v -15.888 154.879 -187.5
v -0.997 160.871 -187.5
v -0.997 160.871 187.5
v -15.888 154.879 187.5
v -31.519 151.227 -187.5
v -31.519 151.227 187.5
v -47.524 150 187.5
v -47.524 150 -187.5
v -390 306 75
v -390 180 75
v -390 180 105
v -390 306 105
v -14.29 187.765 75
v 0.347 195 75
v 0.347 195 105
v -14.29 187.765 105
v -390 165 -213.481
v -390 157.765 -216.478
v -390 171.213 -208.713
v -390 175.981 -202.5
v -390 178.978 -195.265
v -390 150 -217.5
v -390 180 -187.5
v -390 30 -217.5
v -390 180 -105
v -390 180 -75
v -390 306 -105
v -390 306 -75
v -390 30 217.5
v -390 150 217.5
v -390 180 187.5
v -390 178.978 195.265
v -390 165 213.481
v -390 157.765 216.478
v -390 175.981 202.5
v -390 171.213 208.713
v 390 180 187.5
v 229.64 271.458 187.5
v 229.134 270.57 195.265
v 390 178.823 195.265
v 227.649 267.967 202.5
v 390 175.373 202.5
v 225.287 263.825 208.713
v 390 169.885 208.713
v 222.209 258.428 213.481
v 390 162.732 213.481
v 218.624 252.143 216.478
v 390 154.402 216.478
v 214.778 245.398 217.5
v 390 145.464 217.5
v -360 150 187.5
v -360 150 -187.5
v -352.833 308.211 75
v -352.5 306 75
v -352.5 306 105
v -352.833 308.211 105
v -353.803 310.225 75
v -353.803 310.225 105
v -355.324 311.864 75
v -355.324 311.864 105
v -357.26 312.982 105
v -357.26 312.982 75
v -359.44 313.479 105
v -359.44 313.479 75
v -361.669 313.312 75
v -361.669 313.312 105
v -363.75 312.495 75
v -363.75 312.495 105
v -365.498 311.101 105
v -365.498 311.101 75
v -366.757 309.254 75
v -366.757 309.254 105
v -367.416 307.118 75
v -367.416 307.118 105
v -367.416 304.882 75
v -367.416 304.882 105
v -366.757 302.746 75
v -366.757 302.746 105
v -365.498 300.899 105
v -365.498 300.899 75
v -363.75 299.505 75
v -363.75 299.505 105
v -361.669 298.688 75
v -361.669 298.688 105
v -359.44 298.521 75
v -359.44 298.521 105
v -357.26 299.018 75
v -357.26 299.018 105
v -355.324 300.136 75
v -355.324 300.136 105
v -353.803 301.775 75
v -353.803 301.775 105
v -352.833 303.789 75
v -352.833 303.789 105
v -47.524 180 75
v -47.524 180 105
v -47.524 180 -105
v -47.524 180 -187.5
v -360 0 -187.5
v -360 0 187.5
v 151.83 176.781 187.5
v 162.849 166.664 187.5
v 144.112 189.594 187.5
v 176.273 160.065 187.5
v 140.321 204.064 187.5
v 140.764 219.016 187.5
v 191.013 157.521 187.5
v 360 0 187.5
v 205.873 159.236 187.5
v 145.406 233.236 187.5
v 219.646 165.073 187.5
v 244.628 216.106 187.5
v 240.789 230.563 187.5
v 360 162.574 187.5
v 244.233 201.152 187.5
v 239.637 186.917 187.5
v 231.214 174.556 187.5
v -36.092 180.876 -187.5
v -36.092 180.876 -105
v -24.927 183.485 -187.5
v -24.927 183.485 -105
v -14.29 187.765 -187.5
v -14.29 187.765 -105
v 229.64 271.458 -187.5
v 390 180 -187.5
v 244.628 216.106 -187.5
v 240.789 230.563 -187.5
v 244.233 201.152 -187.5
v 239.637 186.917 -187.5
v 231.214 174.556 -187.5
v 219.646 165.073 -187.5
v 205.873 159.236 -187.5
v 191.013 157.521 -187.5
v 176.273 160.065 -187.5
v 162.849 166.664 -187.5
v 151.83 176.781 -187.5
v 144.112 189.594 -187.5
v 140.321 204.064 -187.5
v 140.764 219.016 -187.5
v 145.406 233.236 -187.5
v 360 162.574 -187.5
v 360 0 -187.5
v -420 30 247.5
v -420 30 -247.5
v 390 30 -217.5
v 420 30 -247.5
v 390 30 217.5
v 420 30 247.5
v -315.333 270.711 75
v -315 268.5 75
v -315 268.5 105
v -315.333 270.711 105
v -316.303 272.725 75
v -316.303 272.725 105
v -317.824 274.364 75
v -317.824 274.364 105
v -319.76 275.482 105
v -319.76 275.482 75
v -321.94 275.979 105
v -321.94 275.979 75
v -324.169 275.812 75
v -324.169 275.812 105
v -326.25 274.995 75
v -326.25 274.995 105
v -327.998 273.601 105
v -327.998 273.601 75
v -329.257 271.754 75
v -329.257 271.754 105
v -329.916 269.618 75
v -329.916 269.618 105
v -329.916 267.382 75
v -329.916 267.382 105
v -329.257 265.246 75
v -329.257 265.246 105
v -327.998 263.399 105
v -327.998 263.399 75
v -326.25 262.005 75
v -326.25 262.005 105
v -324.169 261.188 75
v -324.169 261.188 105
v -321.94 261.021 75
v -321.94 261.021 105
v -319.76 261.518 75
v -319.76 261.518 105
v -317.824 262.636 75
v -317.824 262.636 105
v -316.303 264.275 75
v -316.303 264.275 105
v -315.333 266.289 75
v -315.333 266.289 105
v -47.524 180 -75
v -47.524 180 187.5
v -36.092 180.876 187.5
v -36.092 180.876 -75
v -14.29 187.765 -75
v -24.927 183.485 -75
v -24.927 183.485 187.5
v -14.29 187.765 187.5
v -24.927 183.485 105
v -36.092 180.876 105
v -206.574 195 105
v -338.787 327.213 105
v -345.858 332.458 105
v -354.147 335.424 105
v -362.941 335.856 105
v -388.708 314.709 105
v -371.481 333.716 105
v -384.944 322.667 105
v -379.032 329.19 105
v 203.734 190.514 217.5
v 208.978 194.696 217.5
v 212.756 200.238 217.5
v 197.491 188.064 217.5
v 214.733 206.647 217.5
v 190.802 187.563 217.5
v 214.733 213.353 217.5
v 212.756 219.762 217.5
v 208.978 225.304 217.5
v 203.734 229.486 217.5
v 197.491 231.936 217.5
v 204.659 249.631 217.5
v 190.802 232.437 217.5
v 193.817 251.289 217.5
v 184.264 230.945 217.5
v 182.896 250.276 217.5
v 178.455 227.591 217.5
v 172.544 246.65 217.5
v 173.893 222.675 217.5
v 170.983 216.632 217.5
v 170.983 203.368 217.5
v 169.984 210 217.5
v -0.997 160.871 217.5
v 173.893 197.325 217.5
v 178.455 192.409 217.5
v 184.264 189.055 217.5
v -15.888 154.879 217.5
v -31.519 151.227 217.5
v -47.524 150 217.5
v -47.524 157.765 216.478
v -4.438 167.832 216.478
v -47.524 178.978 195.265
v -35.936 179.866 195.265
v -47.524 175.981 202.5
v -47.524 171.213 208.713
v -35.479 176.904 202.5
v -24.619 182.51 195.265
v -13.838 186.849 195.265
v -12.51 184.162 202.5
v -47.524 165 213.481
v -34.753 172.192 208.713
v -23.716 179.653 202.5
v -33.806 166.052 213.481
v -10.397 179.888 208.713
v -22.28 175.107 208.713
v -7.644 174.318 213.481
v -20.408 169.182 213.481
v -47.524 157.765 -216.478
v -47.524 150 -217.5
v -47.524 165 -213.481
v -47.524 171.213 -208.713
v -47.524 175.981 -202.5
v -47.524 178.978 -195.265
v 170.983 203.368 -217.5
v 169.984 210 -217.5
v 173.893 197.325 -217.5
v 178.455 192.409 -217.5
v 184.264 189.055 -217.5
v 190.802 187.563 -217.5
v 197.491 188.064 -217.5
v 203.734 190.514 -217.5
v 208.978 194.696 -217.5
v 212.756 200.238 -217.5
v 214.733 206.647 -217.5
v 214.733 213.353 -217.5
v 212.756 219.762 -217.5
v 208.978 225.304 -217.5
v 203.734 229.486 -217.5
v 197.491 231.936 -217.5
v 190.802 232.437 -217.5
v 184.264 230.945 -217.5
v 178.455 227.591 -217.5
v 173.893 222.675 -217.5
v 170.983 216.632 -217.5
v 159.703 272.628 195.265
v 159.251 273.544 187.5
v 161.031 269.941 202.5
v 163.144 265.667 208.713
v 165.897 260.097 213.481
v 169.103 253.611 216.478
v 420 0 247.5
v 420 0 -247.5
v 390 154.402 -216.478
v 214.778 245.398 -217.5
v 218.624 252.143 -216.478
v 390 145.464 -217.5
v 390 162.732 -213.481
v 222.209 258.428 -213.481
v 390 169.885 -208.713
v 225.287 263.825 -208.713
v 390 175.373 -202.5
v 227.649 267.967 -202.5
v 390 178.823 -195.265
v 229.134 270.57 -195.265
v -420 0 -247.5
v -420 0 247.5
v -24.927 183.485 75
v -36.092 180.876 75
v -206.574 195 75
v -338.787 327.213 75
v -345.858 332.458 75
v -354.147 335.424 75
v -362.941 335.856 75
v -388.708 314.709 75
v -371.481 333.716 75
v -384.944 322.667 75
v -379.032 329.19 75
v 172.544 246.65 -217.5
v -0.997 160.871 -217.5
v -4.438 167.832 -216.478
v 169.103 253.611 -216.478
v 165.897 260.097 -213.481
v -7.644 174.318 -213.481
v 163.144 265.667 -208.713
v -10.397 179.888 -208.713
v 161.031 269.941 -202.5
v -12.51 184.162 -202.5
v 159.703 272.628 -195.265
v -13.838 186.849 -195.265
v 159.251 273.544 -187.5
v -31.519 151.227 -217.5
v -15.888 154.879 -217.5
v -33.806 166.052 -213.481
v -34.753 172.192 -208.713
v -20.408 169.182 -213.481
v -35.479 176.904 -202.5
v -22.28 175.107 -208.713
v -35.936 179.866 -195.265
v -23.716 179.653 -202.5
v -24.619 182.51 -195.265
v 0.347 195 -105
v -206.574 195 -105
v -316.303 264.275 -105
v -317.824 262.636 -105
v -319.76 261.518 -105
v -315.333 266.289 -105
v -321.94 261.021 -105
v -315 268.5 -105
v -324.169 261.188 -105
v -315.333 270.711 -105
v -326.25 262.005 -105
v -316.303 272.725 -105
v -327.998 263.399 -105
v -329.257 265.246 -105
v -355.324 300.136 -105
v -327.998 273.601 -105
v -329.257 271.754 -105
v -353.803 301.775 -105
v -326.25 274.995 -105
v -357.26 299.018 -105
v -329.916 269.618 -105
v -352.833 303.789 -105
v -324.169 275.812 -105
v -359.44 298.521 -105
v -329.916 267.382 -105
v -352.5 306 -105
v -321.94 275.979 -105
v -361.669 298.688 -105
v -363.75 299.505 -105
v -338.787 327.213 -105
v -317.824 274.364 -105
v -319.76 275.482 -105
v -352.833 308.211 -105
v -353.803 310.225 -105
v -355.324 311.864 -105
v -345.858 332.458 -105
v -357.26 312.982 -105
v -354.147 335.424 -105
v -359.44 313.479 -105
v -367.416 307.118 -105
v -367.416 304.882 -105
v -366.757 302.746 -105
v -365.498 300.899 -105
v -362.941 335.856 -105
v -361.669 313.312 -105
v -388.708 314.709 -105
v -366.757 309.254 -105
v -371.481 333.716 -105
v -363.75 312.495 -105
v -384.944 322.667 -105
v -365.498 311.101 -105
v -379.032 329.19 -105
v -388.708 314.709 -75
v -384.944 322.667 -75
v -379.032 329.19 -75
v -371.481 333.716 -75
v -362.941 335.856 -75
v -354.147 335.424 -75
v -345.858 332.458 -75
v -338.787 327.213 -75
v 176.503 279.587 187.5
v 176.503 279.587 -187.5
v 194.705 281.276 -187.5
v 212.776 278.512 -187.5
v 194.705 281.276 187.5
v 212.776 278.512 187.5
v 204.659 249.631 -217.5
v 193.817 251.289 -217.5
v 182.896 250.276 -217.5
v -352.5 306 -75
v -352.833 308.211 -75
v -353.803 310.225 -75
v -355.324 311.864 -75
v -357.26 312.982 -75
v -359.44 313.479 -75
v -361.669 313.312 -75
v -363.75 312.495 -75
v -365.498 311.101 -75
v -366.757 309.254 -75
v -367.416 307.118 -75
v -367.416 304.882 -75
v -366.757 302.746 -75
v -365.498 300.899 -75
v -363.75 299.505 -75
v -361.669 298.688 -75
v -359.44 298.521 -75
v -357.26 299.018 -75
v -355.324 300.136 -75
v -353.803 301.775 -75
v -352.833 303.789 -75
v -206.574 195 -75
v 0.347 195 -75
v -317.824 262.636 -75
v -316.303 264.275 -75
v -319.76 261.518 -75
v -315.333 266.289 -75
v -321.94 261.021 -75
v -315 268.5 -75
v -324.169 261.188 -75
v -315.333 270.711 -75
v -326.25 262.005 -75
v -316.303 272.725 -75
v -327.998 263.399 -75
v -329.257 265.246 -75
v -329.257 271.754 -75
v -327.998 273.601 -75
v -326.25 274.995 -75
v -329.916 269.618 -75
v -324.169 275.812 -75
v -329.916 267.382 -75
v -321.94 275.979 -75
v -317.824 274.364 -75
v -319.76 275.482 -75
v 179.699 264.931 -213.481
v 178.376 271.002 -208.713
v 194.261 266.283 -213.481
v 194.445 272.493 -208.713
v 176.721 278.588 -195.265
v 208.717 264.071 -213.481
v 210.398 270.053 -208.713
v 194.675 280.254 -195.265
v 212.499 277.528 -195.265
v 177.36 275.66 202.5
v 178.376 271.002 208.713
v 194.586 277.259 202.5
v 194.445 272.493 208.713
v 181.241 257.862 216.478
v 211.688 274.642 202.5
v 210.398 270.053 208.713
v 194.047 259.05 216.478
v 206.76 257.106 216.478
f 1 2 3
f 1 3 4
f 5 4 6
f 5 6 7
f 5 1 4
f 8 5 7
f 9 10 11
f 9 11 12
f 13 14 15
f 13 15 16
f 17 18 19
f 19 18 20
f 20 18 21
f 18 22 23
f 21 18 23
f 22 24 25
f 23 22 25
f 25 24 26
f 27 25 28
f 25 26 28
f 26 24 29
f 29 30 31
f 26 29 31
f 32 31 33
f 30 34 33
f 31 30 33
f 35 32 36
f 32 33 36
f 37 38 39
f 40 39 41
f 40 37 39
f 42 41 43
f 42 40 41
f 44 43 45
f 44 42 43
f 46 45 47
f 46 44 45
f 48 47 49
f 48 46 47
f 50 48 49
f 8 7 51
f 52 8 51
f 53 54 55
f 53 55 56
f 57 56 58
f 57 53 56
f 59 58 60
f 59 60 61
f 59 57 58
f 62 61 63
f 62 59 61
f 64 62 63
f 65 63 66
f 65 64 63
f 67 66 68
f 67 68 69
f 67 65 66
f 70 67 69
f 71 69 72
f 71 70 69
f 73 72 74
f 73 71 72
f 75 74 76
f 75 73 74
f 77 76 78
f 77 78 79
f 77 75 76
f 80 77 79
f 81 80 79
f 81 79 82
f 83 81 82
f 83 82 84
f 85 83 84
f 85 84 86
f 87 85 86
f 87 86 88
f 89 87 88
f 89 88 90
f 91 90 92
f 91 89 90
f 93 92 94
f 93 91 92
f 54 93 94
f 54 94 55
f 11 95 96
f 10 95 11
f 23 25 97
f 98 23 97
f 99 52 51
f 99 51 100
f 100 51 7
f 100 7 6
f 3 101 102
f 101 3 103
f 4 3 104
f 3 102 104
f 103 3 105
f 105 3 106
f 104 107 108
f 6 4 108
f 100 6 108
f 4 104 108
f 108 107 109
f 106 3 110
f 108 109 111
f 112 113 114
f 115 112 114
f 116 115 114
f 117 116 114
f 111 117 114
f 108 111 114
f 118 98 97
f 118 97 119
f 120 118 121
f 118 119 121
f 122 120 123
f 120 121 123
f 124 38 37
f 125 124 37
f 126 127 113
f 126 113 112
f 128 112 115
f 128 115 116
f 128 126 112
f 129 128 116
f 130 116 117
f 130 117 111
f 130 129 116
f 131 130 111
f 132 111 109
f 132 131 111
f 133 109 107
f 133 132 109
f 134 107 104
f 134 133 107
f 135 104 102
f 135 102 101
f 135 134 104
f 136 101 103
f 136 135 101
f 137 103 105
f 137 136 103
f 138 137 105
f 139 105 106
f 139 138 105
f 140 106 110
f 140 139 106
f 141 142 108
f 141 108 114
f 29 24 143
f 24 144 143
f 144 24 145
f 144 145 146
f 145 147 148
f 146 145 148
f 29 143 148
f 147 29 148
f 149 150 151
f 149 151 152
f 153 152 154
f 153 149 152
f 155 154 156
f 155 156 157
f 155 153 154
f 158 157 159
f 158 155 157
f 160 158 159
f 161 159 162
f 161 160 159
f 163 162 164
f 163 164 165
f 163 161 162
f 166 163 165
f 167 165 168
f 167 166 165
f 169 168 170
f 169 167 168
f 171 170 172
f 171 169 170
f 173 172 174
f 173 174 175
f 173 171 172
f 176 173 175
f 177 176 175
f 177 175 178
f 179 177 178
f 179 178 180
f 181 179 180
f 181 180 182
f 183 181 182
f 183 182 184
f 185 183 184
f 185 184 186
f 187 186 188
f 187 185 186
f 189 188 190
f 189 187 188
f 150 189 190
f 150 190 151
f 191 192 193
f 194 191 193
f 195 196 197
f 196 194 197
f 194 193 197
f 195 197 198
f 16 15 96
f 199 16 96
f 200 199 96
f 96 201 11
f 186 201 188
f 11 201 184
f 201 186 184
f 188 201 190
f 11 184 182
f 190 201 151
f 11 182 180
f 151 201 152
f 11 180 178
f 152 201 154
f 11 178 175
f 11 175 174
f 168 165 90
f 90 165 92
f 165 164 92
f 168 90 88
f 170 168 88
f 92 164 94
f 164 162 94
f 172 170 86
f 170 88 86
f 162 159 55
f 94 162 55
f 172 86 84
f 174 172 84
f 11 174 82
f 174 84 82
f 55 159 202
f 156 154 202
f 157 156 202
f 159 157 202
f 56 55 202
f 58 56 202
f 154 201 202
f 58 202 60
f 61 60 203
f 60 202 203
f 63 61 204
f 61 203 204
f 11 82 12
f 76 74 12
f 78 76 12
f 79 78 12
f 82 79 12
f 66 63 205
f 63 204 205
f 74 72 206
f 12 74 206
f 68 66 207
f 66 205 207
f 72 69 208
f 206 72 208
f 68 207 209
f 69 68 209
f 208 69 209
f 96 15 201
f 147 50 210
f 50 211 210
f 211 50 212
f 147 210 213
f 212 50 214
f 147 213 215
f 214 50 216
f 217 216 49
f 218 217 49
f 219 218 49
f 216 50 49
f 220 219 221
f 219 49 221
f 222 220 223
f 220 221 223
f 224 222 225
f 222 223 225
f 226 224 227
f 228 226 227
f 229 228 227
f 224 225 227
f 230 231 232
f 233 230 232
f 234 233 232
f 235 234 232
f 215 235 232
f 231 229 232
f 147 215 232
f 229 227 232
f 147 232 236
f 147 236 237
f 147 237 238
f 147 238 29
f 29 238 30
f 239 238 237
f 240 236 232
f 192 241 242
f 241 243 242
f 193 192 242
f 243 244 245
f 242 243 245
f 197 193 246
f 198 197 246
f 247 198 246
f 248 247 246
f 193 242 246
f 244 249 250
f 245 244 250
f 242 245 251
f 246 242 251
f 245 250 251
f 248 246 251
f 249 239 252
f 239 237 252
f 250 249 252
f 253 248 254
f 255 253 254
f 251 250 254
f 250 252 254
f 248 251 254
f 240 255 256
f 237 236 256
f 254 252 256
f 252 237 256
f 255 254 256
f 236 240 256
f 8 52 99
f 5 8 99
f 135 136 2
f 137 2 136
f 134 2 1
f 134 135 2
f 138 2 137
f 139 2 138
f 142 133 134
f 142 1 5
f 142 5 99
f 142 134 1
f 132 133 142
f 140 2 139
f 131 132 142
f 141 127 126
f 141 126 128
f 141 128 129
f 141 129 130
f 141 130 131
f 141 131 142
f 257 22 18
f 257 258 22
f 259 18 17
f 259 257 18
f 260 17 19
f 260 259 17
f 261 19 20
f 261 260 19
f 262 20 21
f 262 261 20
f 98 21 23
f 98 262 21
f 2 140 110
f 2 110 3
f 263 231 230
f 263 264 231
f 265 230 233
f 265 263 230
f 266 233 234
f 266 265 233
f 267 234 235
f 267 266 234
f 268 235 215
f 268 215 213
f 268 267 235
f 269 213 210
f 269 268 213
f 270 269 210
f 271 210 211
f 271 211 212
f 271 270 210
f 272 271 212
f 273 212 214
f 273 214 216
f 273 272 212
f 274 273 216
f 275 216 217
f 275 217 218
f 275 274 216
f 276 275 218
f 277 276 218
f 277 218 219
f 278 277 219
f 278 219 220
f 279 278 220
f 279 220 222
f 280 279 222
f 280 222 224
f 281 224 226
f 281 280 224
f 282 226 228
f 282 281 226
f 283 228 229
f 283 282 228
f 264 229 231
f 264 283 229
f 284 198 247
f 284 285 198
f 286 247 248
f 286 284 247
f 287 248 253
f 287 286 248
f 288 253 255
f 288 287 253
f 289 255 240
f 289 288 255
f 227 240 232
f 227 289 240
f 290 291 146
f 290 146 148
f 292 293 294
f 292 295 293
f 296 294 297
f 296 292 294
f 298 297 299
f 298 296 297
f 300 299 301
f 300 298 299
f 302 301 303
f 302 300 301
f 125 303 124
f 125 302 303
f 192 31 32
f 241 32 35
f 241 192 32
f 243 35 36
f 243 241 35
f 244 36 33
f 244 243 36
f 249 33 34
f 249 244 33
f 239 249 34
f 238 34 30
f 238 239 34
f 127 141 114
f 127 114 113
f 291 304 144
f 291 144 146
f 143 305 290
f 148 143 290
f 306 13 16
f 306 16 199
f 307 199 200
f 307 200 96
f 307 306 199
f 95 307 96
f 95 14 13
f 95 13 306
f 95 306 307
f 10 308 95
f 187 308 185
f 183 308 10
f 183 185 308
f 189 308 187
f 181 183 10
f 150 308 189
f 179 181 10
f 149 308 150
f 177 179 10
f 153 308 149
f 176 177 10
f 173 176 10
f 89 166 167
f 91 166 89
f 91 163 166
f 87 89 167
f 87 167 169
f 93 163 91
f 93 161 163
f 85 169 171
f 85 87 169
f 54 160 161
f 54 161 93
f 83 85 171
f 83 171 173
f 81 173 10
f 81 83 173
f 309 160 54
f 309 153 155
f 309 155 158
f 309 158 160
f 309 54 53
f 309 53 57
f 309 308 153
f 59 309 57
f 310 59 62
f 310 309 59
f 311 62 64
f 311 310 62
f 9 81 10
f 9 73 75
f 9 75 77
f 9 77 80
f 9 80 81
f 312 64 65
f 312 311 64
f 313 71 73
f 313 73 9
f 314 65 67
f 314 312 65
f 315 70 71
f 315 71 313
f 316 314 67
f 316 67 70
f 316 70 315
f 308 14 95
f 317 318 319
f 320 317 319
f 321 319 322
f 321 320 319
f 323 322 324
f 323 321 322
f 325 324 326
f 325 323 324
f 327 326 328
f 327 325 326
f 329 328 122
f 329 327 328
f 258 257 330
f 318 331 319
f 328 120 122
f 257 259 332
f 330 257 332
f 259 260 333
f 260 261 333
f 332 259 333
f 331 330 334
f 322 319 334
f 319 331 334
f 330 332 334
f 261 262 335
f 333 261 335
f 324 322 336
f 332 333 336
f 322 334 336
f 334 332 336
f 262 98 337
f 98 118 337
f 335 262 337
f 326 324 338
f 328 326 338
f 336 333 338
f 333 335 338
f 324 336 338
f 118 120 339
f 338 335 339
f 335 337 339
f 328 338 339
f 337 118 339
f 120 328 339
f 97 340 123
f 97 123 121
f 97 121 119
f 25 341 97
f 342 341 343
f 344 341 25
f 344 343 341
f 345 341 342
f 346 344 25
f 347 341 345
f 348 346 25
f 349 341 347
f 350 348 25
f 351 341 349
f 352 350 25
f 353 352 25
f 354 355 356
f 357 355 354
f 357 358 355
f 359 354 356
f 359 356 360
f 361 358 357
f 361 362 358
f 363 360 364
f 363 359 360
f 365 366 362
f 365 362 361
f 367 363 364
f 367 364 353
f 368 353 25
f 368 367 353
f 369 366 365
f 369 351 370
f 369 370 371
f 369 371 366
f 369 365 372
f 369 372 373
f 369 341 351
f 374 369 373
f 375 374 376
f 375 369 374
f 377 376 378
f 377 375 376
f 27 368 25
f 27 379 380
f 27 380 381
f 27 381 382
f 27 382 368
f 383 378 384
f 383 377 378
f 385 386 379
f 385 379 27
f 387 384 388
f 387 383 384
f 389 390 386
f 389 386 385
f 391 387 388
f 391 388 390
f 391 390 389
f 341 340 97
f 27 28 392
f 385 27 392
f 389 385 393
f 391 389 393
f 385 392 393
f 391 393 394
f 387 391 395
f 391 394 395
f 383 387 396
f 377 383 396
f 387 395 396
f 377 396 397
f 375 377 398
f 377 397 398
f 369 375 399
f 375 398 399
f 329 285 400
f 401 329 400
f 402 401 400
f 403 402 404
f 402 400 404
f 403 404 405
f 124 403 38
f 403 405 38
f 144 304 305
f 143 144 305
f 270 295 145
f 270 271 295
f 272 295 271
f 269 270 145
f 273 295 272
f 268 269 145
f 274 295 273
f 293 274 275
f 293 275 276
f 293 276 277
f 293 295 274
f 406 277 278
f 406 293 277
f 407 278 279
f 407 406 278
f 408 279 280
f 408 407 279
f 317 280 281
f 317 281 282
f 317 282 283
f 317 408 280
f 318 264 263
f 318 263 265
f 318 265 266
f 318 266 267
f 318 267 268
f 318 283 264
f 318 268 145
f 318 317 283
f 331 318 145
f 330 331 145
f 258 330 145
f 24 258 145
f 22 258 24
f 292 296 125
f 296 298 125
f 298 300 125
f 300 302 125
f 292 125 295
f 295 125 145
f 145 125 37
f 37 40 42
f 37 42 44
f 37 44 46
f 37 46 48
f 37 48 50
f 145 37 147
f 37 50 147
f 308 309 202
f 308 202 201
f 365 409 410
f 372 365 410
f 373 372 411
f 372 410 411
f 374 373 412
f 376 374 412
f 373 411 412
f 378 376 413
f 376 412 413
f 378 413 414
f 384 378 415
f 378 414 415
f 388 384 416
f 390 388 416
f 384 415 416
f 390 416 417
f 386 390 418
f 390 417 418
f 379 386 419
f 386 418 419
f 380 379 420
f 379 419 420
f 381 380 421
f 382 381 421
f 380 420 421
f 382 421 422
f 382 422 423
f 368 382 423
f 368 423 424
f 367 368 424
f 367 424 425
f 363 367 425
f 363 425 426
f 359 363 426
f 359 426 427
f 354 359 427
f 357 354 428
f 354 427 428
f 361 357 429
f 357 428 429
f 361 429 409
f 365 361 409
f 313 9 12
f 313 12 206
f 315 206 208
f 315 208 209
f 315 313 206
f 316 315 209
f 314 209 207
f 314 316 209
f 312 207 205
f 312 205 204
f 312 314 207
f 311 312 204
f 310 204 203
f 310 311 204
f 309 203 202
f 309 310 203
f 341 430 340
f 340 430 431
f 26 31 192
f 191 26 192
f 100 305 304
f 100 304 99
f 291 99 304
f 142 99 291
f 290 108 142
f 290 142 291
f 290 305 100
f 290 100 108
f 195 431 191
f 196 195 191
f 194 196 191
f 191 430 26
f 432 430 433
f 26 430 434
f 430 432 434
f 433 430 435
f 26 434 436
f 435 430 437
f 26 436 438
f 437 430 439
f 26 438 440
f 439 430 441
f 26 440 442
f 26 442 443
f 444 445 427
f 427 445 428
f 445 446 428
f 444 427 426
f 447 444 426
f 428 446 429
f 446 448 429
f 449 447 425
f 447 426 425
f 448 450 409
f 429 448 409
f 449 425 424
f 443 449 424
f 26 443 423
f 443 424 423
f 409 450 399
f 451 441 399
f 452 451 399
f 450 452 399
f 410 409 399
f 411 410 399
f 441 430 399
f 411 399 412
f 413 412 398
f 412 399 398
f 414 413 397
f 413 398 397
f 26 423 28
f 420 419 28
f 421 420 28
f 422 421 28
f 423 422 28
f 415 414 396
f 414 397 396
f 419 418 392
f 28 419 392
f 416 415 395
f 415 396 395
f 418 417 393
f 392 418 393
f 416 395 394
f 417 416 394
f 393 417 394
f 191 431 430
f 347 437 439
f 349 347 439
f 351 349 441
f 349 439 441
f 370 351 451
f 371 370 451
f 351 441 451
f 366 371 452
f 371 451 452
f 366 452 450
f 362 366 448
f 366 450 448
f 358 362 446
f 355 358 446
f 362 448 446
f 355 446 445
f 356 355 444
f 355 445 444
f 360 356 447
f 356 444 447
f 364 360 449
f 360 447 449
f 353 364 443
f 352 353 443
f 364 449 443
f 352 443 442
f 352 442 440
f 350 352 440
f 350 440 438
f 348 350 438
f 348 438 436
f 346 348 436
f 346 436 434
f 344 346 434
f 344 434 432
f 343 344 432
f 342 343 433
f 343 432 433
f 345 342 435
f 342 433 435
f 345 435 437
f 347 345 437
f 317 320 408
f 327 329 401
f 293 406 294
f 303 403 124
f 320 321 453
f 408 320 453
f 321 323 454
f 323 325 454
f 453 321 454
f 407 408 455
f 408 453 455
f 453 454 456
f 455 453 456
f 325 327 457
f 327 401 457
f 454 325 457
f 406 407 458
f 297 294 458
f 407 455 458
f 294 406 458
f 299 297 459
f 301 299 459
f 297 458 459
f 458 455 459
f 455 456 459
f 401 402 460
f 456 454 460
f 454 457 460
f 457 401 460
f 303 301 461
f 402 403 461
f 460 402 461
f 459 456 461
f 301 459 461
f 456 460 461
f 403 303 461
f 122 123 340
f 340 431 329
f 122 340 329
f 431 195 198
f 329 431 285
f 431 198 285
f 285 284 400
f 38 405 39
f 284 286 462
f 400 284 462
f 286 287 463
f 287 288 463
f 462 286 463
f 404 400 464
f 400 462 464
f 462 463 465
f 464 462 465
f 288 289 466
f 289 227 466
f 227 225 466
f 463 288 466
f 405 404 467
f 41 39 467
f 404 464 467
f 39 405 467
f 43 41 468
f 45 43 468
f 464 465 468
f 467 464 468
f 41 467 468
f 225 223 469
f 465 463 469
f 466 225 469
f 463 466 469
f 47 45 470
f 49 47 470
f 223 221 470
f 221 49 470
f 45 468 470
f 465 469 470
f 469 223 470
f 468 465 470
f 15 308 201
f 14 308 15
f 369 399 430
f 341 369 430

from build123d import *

# Parameters (mm, degrees)
SKETCH1_R           = 22.5
BOSS_EXTRUDE1_DEPTH = 217.5
BOSS_EXTRUDE2_START = -142.5
SKETCH2_R           = 7.5
BOSS_EXTRUDE2_DEPTH = 30
SHELL1_START        = -187.5
SHELL1_DEPTH        = 375
SKETCH3_W           = 840
SKETCH3_H           = 495
SKETCH3_W_2         = 720
SKETCH3_H_2         = 375
BOSS_EXTRUDE3_DEPTH = 30
FILLET1_R           = 30


# Read off the part's stored shape, not the designer's step: Shell1
with BuildPart() as part:
    # Sketch1 → Boss-Extrude1 (new, symmetric)
    with BuildSketch(Plane.XY):
        with BuildLine():
            Line((390, 0), (-390, 0))
            Line((-390, 0), (-390, 180))
            Line((-390, 180), (-47.523825825, 180))
            ThreePointArc((-47.523825825, 180), (-30.459602431, 181.967046616), (-14.290475646, 187.765005868))
            Line((-14.290475646, 187.765005868), (159.250519483, 273.543977608))
            ThreePointArc((159.250519483, 273.543977608), (194.705480887, 281.276072546), (229.640352409, 271.45801102))
            Line((229.640352409, 271.45801102), (390, 180))
            Line((390, 180), (390, 0))
        make_face()
        with Locations(Location((192.483869662, 210, 0), (0, 0, 180))):
            Circle(SKETCH1_R, mode=Mode.SUBTRACT)
    extrude(amount=BOSS_EXTRUDE1_DEPTH, both=True)


with BuildPart() as body_2:
    # Sketch2 → Boss-Extrude2 (new body)
    with BuildSketch(Plane.XY.offset(217.5).offset(BOSS_EXTRUDE2_START)):
        with BuildLine():
            Line((-390, 180), (-390, 306))
            ThreePointArc((-390, 306), (-371.480502971, 333.716385975), (-338.786796564, 327.213203436))
            Line((-338.786796564, 327.213203436), (-206.573593129, 195))
            Line((-206.573593129, 195), (0.34677234, 195))
            Line((0.34677234, 195), (-14.290475646, 187.765005868))
            ThreePointArc((-14.290475646, 187.765005868), (-30.459602431, 181.967046616), (-47.523825825, 180))
            Line((-47.523825825, 180), (-390, 180))
        make_face()
        with Locations((-360, 306)):
            Circle(SKETCH2_R, mode=Mode.SUBTRACT)
        with Locations((-322.5, 268.5)):
            Circle(SKETCH2_R, mode=Mode.SUBTRACT)
    boss_extrude2 = extrude(amount=BOSS_EXTRUDE2_DEPTH)


with BuildPart() as part_1:
    add(part.part)

    # Mirror7: Boss-Extrude2 across plane
    add(boss_extrude2.mirror(Plane.XY))

    # Shell1 outline → Shell1 (cut)
    with BuildSketch(Plane.XY.offset(SHELL1_START)):
        with BuildLine():
            Line((145.405891256, 233.236048487), (-0.997135575, 160.871008216))
            ThreePointArc((-0.997135575, 160.871008216), (-23.633913073, 152.753865263), (-47.523825825, 150))
            Line((-47.523825825, 150), (-360, 150))
            Line((-360, 150), (-360, 0))
            Line((-360, 0), (360, 0))
            Line((360, 0), (360, 162.573715059))
            Line((360, 162.573715059), (240.789153251, 230.563306577))
            ThreePointArc((240.789153251, 230.563306577), (191.013340222, 157.520598868), (145.405891256, 233.236048487))
        make_face()
    extrude(amount=SHELL1_DEPTH, mode=Mode.SUBTRACT)

    # Sketch3 → Boss-Extrude3 (add)
    with BuildSketch(Plane.XZ):
        Rectangle(SKETCH3_W, SKETCH3_H)
        Rectangle(SKETCH3_W_2, SKETCH3_H_2, mode=Mode.SUBTRACT)
    extrude(amount=-BOSS_EXTRUDE3_DEPTH)

    # Fillet1
    fillet1_edges = [part_1.edges().sort_by_distance(p)[0] for p in [
        (-218.761912913, 180, -217.5),
        (-30.459602431, 181.967046616, -217.5),
        (309.820176204, 225.72900551, 217.5),
        (194.705480887, 281.276072546, 217.5),
        (72.480021918, 230.654491738, 217.5),
        (-30.459602431, 181.967046616, 217.5),
        (-218.761912913, 180, 217.5),
        (72.480021918, 230.654491738, -217.5),
        (194.705480887, 281.276072546, -217.5),
        (309.820176204, 225.72900551, -217.5),
    ]]
    fillet(fillet1_edges, radius=FILLET1_R)


solid = Compound([body_2.part, part_1.part])
